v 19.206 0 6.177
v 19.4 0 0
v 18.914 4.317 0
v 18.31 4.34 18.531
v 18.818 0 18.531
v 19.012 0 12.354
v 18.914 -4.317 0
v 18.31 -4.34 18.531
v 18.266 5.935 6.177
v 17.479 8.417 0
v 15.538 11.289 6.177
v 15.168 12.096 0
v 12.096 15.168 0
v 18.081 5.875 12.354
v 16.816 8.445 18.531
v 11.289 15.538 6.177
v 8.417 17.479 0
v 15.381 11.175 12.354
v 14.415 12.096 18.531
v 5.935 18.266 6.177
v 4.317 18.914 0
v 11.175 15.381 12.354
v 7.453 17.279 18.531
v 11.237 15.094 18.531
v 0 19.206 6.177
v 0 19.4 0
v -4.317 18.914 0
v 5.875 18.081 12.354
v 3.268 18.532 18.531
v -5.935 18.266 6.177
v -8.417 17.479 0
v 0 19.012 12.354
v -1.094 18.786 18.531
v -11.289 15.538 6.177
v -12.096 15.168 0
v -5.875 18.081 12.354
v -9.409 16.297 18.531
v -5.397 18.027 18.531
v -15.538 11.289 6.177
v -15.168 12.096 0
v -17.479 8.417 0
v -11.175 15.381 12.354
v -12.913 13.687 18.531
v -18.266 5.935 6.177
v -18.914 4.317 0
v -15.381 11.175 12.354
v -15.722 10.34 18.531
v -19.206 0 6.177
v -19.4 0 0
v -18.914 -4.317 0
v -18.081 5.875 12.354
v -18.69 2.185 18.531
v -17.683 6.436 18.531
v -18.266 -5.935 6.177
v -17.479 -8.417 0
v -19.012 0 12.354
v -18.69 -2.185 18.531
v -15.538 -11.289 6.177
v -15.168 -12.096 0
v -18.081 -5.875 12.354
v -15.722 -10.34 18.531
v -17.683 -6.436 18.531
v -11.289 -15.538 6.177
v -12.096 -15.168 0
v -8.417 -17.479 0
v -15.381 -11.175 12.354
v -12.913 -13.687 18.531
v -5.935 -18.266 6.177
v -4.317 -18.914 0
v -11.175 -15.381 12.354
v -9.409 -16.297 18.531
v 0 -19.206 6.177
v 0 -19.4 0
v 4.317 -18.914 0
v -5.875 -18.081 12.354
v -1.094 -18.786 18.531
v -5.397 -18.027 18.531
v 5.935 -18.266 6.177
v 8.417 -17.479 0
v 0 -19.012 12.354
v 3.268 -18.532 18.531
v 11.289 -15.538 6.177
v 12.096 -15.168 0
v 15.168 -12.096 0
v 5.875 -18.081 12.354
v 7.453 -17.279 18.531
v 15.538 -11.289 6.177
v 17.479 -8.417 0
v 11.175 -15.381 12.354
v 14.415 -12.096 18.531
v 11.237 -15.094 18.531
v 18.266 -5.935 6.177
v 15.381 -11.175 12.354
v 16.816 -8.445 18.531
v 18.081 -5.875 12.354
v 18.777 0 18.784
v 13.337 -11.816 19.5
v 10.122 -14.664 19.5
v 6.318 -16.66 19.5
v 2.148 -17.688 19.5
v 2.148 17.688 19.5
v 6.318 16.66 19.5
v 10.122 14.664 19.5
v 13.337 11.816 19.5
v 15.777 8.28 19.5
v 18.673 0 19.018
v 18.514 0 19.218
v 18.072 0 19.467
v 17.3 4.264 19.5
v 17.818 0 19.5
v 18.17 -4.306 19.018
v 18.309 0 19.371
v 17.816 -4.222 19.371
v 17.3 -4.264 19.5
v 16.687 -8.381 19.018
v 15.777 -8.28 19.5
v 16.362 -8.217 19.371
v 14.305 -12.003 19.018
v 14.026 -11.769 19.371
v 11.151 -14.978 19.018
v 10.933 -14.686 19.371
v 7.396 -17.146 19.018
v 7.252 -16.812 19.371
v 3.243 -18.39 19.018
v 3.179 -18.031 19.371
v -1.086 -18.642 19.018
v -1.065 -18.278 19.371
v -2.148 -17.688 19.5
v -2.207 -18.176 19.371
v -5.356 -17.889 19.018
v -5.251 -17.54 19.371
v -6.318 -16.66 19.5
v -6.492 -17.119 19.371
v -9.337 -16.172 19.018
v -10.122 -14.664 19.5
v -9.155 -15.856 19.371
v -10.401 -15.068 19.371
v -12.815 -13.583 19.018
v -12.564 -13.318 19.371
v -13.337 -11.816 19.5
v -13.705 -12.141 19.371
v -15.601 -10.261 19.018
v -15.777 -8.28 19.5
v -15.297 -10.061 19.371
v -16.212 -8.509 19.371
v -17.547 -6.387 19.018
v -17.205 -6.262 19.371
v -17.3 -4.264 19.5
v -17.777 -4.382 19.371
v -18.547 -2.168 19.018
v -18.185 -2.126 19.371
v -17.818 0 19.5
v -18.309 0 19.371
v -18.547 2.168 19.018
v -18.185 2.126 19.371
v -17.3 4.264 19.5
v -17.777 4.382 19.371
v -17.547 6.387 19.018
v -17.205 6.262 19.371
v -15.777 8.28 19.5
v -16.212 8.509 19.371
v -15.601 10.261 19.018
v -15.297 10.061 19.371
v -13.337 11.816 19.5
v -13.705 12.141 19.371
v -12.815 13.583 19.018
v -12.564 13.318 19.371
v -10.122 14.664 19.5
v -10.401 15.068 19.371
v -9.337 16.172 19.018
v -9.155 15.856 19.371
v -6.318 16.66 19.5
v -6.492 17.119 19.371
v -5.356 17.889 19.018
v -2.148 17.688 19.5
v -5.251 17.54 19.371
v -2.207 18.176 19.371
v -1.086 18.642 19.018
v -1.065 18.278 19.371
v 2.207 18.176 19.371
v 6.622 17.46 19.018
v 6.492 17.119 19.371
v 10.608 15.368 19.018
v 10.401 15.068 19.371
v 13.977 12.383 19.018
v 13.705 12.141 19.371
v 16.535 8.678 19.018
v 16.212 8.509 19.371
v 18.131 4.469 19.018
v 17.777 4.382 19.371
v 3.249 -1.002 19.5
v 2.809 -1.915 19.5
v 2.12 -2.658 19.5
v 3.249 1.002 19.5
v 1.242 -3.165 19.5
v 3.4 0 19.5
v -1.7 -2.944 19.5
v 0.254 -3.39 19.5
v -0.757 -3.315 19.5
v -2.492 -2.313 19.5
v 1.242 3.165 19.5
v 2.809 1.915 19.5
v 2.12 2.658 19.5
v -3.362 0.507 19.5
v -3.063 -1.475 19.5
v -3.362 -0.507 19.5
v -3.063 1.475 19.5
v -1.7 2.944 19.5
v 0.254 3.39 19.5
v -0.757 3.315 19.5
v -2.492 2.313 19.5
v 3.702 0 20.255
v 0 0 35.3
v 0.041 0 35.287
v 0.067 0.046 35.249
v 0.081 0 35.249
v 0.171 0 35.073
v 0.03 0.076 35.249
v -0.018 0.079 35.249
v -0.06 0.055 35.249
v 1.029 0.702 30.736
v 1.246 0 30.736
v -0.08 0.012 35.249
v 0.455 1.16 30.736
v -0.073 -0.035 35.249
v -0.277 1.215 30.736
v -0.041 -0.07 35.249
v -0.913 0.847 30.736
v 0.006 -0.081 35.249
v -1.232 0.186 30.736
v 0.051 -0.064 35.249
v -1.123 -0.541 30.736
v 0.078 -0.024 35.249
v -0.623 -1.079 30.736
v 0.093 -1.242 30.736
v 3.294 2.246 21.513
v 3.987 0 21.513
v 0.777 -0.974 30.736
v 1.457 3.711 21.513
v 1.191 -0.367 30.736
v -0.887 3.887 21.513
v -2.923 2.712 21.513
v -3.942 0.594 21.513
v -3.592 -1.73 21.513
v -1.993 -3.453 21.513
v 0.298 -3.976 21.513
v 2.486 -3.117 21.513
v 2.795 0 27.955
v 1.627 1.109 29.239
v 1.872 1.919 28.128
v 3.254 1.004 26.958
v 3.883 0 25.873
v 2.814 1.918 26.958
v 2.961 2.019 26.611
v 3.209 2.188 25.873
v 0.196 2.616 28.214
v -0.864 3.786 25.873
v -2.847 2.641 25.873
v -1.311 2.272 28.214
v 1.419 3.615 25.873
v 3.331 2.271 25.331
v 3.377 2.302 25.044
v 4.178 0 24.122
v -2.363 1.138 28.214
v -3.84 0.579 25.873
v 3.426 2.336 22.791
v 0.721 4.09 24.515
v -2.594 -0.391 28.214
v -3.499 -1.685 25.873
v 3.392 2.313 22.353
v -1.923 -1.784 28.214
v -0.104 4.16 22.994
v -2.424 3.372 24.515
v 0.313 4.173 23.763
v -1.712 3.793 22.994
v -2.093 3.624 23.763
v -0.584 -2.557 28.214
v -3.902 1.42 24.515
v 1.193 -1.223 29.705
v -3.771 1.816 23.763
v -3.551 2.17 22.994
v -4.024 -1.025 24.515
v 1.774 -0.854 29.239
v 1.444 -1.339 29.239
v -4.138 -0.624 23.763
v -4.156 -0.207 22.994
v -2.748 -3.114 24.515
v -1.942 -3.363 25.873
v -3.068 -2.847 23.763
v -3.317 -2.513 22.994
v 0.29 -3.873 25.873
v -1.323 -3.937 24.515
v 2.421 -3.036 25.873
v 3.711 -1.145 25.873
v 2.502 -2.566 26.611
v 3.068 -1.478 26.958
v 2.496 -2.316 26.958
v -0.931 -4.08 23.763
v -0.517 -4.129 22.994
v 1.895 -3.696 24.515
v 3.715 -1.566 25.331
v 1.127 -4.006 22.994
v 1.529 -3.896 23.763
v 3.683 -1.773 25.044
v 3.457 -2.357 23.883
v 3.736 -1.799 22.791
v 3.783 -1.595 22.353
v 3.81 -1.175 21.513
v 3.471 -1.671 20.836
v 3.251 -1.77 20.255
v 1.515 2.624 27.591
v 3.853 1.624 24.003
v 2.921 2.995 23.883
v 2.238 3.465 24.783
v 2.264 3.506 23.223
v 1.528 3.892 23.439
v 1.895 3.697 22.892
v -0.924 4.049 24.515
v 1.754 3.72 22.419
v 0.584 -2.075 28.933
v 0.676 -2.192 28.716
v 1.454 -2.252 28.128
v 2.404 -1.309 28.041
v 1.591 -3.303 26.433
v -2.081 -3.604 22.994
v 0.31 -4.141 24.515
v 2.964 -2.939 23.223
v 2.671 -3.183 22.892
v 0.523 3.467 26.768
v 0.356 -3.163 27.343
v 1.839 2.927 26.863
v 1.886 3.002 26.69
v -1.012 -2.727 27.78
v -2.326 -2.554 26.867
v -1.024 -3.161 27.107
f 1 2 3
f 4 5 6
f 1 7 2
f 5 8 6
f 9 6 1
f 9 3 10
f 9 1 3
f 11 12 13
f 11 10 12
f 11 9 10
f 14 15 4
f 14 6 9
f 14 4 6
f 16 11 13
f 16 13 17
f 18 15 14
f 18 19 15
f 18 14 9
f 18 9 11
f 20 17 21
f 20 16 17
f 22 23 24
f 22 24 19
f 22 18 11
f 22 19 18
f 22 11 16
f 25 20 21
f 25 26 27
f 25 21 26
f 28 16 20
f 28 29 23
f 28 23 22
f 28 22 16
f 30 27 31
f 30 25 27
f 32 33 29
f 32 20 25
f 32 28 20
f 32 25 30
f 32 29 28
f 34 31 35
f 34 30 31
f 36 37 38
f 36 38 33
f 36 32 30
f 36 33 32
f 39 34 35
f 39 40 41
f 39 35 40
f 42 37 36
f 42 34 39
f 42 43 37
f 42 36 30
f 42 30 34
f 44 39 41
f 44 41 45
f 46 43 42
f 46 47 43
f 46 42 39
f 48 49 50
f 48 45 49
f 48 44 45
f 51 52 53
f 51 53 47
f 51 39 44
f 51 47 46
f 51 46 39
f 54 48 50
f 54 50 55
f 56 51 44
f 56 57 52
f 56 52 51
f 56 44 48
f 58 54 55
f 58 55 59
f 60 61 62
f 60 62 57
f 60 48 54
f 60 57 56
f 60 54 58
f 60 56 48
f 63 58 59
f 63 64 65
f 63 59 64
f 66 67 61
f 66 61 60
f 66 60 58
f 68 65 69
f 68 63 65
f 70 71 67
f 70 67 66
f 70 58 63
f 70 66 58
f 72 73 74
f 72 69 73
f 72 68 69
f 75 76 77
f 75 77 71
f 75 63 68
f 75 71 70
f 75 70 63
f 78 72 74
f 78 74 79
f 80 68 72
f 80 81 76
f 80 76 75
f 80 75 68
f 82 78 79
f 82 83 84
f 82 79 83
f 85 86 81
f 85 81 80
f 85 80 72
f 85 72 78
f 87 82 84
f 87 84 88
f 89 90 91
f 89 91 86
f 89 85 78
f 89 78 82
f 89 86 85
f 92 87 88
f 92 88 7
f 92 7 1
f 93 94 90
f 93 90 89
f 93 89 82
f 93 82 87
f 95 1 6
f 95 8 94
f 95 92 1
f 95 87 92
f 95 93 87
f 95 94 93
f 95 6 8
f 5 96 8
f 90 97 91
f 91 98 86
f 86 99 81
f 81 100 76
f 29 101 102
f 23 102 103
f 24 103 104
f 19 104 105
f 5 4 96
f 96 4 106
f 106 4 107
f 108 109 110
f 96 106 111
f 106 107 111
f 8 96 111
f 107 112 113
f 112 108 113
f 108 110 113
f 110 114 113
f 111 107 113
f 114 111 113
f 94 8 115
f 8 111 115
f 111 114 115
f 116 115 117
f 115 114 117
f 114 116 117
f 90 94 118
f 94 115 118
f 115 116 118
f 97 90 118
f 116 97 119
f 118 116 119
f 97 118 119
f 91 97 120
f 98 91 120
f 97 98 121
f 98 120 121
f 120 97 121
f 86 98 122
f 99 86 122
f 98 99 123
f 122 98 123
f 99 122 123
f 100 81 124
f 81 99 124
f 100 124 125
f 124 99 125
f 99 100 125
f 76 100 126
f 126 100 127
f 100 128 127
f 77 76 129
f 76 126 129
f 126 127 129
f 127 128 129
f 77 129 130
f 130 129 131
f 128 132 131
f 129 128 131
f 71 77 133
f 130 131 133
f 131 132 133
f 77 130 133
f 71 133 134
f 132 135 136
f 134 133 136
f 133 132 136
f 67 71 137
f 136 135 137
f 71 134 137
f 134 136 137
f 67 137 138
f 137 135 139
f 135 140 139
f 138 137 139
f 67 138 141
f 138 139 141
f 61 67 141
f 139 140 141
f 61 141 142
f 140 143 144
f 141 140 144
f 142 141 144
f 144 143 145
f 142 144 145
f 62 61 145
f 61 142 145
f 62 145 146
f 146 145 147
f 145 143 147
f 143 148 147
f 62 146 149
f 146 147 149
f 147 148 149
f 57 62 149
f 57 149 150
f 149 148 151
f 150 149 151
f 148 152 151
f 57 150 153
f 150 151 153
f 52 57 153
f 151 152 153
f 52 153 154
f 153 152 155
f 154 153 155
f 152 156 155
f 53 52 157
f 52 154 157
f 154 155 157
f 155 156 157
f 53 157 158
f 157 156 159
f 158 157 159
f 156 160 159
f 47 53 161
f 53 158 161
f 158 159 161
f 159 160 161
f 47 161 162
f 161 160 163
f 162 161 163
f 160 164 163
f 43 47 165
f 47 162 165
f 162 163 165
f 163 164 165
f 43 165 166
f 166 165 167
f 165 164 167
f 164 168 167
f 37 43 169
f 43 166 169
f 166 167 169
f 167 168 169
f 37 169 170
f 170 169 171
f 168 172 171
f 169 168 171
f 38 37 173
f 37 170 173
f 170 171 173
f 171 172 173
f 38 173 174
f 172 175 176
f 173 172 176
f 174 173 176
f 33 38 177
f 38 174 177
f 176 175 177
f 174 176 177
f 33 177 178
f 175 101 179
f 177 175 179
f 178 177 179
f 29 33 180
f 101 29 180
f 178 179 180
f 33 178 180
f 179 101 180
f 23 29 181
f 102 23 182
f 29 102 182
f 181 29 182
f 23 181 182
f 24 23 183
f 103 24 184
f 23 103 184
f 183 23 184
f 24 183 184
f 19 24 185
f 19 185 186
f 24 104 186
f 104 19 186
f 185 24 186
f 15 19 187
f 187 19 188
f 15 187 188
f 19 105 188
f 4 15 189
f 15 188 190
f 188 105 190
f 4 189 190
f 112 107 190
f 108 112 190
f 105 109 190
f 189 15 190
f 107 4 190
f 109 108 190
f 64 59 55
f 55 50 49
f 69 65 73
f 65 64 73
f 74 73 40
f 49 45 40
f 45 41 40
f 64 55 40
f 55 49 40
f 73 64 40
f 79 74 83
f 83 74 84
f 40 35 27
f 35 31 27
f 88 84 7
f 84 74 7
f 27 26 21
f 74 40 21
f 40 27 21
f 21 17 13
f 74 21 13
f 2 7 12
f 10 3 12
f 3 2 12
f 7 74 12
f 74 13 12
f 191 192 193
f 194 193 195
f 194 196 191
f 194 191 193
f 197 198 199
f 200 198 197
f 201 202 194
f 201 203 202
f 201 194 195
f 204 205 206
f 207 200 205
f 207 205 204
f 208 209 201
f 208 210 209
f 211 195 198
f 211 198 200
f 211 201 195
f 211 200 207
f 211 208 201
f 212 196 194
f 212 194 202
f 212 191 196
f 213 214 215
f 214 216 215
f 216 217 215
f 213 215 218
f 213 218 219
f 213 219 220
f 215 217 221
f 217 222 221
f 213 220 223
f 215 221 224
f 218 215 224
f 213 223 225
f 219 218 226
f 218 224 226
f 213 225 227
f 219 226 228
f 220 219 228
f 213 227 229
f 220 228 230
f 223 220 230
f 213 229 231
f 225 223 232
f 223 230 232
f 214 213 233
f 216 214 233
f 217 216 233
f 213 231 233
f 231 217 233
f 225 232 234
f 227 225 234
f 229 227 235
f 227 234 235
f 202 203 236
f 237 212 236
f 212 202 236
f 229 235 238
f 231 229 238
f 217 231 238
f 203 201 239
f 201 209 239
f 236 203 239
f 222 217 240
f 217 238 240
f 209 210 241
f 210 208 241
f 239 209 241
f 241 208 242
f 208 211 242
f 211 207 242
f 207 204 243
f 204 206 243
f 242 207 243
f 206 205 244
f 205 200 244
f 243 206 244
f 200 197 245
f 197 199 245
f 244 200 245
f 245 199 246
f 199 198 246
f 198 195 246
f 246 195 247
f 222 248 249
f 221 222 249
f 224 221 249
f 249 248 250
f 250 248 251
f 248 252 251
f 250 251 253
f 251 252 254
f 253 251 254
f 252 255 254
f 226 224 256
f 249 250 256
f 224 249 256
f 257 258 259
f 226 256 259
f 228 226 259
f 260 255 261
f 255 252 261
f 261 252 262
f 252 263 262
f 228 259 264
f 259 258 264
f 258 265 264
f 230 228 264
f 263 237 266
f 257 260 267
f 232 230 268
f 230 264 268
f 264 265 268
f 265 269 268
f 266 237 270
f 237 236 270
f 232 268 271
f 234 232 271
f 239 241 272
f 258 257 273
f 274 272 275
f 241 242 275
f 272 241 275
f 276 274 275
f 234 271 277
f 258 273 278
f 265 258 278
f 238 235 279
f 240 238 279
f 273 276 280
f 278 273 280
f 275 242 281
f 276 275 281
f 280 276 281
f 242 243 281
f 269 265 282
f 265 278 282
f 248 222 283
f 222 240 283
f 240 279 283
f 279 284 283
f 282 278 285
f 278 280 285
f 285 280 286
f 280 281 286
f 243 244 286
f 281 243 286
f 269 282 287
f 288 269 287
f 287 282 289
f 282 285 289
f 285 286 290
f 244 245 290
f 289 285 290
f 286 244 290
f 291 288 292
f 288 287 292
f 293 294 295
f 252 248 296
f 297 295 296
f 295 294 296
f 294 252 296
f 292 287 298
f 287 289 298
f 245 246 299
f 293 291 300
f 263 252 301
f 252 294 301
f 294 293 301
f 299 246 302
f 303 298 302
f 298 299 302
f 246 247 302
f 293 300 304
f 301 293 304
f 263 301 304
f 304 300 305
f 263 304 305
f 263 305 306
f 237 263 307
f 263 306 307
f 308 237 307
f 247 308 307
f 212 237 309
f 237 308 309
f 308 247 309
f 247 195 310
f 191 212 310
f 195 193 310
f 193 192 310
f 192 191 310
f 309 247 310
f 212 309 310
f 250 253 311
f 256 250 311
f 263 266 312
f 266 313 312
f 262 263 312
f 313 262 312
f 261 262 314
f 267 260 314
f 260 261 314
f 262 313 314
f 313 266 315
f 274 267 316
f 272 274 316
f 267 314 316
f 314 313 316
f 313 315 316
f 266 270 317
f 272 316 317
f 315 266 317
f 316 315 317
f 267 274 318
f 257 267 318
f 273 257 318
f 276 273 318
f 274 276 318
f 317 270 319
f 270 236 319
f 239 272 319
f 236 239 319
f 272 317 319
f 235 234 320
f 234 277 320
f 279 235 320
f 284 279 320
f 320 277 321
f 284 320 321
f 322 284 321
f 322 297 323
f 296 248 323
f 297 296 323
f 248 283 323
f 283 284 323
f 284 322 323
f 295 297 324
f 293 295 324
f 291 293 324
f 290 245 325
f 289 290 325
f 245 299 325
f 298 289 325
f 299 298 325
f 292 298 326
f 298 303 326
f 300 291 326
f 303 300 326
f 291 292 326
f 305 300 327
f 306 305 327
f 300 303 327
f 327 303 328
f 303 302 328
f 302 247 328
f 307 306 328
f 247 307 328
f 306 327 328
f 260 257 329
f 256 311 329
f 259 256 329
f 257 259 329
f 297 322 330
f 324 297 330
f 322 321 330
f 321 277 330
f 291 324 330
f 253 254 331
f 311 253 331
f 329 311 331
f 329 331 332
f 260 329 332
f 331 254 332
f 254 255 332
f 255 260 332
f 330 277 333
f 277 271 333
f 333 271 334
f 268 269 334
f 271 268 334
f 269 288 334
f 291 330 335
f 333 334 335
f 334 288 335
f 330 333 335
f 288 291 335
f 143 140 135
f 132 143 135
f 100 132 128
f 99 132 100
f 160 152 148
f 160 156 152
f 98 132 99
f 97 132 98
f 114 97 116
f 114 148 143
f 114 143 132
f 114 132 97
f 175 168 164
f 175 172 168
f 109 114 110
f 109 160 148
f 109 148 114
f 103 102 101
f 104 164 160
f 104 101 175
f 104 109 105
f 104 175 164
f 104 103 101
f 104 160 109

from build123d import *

# Parameters (mm, degrees)
F0_R     = 19.4
F1_DEPTH = 19.5
F1_TAPER = 1.8
F2_R     = 1


with BuildPart() as f1:
    # F0 (on Top) → F1 (new body)
    with BuildSketch(Plane.XY):
        Circle(F0_R)
    extrude(amount=F1_DEPTH, taper=F1_TAPER)

    # F2
    f2_edges = [f1.edges().sort_by_distance(p)[0] for p in [
        (-18.787188, 0, 19.5),
    ]]
    fillet(f2_edges, radius=F2_R)


with BuildPart() as f4:
    # F3 (on Front) → F4 (revolve)
    with BuildSketch(Plane.XZ):
        with BuildLine():
            Line((0, 35.3), (0, 19.5))
            Line((0, 19.5), (3.4, 19.5))
            add(Edge.make_bspline(
                [(0, 35.3), (0.3514138506, 35.3), (0.7626081453, 29.46873678), (5.1272824874, 26.2278929629), (3.8115450167, 20.1232167091), (3.4, 19.5)],
                knots=[0, 0, 0, 0, 0.3118431753, 0.6610847354, 1, 1, 1, 1], degree=3))
        make_face()
    revolve(axis=Axis((0, 0, 27.4), (0, 0, 1)))


solid = Compound([f1.part, f4.part])
